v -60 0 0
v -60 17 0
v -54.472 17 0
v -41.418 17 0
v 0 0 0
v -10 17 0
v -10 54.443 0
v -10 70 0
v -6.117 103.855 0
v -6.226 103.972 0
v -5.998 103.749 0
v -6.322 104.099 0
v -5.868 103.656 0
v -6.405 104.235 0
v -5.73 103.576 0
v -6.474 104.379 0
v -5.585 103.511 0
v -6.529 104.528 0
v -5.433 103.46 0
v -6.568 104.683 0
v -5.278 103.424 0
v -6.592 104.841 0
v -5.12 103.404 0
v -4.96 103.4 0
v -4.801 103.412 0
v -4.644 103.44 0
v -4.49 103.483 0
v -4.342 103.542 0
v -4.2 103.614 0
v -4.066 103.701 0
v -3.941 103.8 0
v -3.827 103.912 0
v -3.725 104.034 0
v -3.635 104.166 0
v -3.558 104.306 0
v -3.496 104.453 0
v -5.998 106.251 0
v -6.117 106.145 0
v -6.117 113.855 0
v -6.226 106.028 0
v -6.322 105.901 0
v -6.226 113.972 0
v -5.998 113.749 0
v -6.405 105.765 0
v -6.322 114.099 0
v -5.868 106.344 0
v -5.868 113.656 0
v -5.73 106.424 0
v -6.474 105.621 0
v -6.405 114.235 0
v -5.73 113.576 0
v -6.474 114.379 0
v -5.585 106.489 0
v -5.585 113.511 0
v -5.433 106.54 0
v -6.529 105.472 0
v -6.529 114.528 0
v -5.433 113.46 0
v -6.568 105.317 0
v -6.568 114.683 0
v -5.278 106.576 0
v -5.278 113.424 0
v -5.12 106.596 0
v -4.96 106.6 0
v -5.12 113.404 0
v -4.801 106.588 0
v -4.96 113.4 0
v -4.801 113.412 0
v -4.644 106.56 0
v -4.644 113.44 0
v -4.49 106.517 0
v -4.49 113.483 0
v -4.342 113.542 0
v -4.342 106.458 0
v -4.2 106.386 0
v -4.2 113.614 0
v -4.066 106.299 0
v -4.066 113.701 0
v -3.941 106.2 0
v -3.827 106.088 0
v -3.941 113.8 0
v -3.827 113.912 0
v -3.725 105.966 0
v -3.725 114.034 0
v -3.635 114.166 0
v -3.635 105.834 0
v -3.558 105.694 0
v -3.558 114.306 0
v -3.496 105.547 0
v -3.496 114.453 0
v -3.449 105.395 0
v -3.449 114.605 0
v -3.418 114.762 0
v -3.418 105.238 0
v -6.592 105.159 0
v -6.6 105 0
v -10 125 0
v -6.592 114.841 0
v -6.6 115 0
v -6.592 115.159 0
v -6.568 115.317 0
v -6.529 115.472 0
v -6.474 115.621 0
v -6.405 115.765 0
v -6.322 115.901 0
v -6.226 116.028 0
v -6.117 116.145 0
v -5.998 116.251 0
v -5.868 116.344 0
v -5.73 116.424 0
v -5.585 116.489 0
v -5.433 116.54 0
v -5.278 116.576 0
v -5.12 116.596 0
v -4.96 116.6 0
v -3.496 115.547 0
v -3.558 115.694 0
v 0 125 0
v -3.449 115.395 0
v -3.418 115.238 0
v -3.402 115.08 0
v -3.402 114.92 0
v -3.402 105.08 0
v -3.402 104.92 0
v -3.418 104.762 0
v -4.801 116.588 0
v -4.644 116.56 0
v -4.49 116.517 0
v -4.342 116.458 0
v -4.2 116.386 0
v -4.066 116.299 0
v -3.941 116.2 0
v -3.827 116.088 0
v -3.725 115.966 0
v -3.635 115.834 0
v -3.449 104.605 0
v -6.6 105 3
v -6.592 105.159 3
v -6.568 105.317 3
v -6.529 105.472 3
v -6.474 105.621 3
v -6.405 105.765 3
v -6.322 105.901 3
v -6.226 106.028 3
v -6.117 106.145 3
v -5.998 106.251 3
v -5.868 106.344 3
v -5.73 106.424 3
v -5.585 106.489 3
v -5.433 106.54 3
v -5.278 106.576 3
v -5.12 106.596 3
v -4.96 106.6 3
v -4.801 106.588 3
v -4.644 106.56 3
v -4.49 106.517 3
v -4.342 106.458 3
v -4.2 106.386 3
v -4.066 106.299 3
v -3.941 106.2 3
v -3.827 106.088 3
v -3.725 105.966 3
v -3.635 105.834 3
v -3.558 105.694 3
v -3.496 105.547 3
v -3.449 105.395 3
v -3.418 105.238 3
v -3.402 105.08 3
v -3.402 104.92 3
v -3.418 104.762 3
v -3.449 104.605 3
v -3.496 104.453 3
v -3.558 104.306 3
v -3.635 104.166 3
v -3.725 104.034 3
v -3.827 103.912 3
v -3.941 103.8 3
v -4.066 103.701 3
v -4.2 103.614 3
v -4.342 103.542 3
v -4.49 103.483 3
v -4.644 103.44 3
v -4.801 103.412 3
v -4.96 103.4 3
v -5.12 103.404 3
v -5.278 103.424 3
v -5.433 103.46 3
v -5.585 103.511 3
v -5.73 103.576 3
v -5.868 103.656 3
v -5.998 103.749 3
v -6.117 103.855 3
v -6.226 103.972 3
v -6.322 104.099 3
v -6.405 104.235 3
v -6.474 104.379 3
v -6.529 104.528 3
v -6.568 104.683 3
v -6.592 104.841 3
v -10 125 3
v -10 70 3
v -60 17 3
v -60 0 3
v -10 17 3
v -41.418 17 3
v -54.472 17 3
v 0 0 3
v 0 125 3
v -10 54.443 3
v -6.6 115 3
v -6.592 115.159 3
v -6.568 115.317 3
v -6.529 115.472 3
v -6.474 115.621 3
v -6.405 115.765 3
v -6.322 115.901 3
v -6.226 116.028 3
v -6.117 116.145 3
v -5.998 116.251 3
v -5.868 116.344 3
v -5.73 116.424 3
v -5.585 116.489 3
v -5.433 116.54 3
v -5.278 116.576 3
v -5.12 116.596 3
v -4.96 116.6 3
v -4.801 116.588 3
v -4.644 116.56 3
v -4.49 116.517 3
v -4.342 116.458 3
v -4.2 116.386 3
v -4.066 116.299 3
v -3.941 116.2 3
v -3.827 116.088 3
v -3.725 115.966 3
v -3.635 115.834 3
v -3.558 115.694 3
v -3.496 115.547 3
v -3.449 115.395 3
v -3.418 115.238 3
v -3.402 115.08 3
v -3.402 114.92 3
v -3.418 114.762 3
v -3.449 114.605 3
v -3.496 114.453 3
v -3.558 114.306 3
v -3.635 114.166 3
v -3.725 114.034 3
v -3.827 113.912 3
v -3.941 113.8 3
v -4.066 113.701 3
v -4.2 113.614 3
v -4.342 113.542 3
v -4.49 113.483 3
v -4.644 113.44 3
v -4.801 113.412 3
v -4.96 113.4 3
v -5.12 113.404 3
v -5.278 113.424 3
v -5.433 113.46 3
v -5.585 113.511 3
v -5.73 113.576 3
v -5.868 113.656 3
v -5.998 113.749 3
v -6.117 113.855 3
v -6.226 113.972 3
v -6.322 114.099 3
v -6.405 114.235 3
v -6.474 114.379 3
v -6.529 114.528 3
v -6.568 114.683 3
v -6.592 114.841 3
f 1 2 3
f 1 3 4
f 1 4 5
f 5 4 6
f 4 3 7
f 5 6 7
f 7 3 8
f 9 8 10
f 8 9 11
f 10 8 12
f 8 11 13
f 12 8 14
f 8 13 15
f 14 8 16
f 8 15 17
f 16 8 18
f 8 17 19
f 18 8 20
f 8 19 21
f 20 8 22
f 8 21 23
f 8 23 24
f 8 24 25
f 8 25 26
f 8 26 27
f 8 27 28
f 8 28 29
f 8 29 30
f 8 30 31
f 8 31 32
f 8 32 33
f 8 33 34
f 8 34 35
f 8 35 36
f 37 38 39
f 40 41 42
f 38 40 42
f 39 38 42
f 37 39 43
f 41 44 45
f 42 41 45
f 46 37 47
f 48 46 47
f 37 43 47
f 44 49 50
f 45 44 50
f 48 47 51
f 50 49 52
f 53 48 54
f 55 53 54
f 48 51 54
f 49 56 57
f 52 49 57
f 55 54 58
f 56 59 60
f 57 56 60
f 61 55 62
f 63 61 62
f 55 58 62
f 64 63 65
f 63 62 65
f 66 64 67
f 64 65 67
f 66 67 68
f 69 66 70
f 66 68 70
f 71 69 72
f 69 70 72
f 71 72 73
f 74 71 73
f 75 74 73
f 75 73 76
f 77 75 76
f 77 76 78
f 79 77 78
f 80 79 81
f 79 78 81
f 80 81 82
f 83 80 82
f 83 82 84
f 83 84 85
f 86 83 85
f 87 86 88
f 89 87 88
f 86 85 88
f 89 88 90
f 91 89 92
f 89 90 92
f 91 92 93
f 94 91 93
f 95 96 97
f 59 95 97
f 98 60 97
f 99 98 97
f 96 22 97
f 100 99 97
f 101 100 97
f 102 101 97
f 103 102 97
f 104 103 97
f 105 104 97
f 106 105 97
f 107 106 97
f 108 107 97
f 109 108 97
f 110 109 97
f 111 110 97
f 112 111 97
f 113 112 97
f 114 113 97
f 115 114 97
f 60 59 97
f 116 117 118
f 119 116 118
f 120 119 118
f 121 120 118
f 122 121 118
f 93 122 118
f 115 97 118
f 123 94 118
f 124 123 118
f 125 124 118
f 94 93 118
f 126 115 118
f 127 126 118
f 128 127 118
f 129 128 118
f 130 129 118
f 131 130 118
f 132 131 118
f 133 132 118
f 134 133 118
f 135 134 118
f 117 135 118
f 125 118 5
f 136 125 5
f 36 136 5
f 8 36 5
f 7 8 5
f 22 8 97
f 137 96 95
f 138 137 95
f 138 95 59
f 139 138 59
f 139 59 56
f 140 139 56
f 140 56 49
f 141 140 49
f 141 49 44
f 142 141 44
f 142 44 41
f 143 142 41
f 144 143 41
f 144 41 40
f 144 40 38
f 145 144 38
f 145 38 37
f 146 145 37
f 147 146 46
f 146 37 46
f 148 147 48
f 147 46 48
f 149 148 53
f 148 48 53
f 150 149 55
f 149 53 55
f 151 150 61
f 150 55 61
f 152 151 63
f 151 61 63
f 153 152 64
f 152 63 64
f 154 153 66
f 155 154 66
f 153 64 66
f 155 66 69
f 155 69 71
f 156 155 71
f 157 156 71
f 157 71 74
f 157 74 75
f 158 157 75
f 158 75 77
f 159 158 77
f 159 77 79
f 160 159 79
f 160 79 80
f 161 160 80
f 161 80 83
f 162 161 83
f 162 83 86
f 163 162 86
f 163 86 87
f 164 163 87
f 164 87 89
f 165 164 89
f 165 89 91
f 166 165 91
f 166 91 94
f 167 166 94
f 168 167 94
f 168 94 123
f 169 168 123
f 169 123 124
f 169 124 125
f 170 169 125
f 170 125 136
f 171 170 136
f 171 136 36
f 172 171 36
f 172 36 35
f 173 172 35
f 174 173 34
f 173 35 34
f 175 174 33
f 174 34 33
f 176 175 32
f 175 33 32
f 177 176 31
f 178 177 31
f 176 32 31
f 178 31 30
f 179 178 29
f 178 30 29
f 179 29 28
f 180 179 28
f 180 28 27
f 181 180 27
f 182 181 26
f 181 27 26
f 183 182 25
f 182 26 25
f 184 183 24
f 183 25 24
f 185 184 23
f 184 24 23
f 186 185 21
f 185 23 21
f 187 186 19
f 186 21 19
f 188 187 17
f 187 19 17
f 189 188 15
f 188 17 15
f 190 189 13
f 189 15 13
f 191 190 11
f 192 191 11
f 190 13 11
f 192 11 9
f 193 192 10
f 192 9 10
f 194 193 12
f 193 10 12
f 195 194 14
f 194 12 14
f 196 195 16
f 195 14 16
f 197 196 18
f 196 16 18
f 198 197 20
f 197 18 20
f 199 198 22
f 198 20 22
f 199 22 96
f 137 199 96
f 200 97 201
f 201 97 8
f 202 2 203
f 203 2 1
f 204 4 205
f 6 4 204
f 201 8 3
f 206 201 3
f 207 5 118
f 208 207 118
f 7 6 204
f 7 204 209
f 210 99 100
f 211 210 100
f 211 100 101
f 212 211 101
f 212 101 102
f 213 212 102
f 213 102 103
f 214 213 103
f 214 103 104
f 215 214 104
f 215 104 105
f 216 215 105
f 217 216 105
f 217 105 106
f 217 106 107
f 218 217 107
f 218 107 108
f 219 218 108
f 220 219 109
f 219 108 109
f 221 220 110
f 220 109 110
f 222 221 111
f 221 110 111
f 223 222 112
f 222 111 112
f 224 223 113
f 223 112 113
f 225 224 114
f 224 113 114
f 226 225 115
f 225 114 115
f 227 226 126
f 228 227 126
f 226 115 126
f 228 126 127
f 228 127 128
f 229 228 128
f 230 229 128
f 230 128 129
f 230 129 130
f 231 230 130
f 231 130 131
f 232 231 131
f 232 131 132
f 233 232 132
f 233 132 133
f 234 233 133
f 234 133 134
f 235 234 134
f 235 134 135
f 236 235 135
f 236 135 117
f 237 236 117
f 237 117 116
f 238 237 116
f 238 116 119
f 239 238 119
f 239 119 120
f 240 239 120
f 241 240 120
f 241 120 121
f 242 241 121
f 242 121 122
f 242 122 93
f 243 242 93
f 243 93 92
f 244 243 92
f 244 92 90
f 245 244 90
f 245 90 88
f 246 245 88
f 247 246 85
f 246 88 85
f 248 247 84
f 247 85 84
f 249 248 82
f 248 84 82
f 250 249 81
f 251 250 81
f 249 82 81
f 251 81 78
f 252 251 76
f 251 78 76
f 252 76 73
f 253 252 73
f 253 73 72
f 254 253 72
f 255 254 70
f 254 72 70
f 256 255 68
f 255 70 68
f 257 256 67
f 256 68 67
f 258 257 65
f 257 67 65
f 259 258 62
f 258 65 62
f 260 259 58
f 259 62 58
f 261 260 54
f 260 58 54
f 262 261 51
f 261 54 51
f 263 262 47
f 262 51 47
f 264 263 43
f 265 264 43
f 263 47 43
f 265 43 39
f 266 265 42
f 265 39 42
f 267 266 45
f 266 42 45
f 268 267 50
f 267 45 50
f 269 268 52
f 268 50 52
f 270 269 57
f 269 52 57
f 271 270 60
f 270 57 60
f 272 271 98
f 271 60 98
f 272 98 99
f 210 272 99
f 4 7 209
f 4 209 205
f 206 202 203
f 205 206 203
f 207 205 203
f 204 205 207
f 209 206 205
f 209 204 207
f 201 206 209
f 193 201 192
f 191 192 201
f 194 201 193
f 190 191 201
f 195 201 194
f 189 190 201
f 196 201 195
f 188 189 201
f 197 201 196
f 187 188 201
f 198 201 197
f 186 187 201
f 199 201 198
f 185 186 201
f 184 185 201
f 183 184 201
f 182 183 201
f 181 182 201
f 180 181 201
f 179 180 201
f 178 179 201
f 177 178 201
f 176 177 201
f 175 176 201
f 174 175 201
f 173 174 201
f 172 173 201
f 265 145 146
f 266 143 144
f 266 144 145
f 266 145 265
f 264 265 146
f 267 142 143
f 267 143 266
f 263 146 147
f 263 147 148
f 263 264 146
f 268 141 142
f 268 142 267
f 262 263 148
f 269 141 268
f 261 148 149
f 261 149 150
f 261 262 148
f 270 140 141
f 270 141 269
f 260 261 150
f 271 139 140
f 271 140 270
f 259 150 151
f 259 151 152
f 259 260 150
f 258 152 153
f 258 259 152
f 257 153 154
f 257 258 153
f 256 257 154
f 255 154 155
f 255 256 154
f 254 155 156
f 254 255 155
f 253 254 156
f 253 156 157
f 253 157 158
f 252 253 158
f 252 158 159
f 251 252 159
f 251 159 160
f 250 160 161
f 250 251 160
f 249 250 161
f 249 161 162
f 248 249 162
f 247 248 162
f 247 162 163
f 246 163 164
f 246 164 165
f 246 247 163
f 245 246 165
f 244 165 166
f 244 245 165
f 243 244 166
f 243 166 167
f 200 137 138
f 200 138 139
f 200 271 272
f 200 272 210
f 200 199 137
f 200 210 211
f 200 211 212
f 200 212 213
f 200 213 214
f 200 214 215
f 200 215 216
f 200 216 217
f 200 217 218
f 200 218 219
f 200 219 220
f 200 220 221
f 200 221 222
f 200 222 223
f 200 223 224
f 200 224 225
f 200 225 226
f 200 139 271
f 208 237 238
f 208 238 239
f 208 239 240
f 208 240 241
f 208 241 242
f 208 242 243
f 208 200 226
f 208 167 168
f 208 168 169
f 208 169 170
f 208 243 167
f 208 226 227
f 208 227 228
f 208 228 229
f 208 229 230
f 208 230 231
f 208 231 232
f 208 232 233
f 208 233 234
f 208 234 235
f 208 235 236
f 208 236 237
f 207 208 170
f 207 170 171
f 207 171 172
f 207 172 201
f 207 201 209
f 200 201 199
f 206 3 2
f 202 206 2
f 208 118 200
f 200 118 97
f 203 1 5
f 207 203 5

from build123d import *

# Parameters (mm, degrees)
AUFSATZ_LINEAR_AUSTRAGEN1_DEPTH      = 3
F_3_2_3_2_DURCHMESSER_BOHRUNG1_D     = 3.2
F_3_2_3_2_DURCHMESSER_BOHRUNG1_DEPTH = 8.5
F_3_2_3_2_DURCHMESSER_BOHRUNG1_TIP   = 0.96137699


with BuildPart() as part:
    # Skizze1 → Aufsatz-Linear austragen1 (new body)
    with BuildSketch(Plane.XY):
        Polygon((-10, 70), (-54.472280452, 17), (-60, 17), (-60, 0), (0, 0), (0, 125), (-10, 125), align=None)
        Polygon((-10, 54.442761731), (-41.418207559, 17), (-10, 17), align=None, mode=Mode.SUBTRACT)
    extrude(amount=AUFSATZ_LINEAR_AUSTRAGEN1_DEPTH)

    # Ø3.2 (3.2) Durchmesser Bohrung1
    with Locations(Plane.XY.offset(3)):
        with Locations((-5, 115), (-5, 105)):
            Hole(F_3_2_3_2_DURCHMESSER_BOHRUNG1_D / 2, depth=F_3_2_3_2_DURCHMESSER_BOHRUNG1_DEPTH)
            with Locations((0, 0, -(F_3_2_3_2_DURCHMESSER_BOHRUNG1_DEPTH + F_3_2_3_2_DURCHMESSER_BOHRUNG1_TIP / 2))):  # 118° drill point
                Cone(0, F_3_2_3_2_DURCHMESSER_BOHRUNG1_D / 2, F_3_2_3_2_DURCHMESSER_BOHRUNG1_TIP, mode=Mode.SUBTRACT)


solid = part.part
